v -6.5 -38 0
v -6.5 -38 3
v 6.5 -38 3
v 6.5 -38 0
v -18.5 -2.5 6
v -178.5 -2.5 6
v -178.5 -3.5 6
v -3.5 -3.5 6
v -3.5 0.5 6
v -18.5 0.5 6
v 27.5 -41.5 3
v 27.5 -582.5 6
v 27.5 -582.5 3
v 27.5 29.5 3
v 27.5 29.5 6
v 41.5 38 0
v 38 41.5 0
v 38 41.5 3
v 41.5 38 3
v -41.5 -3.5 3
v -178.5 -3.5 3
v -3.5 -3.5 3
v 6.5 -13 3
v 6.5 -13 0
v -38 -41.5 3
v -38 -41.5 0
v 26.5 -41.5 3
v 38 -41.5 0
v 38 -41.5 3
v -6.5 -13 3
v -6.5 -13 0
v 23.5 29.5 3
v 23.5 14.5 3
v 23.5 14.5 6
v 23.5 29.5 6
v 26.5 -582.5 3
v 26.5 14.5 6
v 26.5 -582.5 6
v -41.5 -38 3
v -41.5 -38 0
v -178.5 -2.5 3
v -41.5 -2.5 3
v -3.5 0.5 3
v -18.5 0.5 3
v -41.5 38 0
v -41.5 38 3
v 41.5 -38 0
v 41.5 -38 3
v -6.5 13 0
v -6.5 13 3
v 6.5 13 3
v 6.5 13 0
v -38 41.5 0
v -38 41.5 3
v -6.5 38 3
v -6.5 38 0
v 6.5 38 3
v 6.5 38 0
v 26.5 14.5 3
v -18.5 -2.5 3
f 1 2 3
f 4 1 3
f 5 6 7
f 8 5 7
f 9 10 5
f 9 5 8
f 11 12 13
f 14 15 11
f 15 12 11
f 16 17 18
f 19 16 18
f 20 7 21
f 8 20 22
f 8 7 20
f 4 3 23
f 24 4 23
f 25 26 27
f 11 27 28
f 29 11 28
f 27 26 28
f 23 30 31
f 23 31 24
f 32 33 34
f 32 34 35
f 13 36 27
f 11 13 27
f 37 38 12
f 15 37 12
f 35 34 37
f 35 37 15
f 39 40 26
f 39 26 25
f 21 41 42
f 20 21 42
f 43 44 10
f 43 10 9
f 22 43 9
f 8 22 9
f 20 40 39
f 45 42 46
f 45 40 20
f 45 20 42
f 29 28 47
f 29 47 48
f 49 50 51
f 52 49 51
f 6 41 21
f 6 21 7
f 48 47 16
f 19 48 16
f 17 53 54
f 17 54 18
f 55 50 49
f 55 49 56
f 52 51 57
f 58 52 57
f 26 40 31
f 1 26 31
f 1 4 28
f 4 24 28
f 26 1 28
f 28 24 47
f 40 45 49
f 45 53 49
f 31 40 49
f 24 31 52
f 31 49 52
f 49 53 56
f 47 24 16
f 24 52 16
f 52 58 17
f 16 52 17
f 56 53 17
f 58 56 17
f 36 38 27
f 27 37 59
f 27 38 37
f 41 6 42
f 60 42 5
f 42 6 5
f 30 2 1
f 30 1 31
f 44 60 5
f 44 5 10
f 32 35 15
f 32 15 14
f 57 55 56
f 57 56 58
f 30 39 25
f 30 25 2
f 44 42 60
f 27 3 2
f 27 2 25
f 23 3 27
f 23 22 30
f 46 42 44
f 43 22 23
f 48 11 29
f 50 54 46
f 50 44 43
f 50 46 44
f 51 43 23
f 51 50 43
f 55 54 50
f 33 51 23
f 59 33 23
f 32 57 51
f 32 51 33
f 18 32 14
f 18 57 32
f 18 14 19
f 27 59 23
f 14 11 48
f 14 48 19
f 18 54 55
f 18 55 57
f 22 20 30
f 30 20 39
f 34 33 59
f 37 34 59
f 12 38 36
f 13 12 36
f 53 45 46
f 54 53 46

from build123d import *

# Parameters (mm, degrees)
SKETCH1_W           = 83
SKETCH1_H           = 83
BOSS_EXTRUDE1_DEPTH = 3
SKETCH2_W           = 13
SKETCH2_H           = 25
CUT_EXTRUDE1_DEPTH  = 3
CHAMFER1_SIZE       = 3.5
SKETCH3_W           = 15
SKETCH3_H           = 3
SKETCH3_W_2         = 3
SKETCH3_H_2         = 15
BOSS_EXTRUDE2_DEPTH = 3
SKETCH5_W           = 175
SKETCH5_H           = 3
BOSS_EXTRUDE4_DEPTH = 1
SKETCH6_W           = 3
SKETCH6_H           = 612
BOSS_EXTRUDE5_DEPTH = 1


with BuildPart() as part:
    # Sketch1 → Boss-Extrude1 (new body)
    with BuildSketch(Plane.XY):
        Rectangle(SKETCH1_W, SKETCH1_H)
    extrude(amount=BOSS_EXTRUDE1_DEPTH)

    # Sketch2 → Cut-Extrude1 (cut)
    with BuildSketch(Plane.XY.offset(3)):
        with Locations((0, 25.5)):
            Rectangle(SKETCH2_W, SKETCH2_H)
        with Locations((0, -25.5)):
            Rectangle(SKETCH2_W, SKETCH2_H)
    extrude(amount=-CUT_EXTRUDE1_DEPTH, mode=Mode.SUBTRACT)

    # Chamfer1
    chamfer1_edges = [part.edges().sort_by_distance(p)[0] for p in [
        (-41.5, 41.5, 1.5),
        (41.5, 41.5, 1.5),
        (41.5, -41.5, 1.5),
        (-41.5, -41.5, 1.5),
    ]]
    chamfer(chamfer1_edges, length=CHAMFER1_SIZE)

    # Sketch3 → Boss-Extrude2 (add)
    with BuildSketch(Plane.XY.offset(3)):
        with Locations((-11, -1)):
            Rectangle(SKETCH3_W, SKETCH3_H)
        with Locations((25, 22)):
            Rectangle(SKETCH3_W_2, SKETCH3_H_2)
    extrude(amount=BOSS_EXTRUDE2_DEPTH)

    # Sketch5 → Boss-Extrude4 (add)
    with BuildSketch(Plane.XZ.offset(2.5)):
        with Locations((-91, 4.5)):
            Rectangle(SKETCH5_W, SKETCH5_H)
    extrude(amount=BOSS_EXTRUDE4_DEPTH)

    # Sketch6 → Boss-Extrude5 (add)
    with BuildSketch(Plane(origin=(26.5, 0, 0), x_dir=(0, 0, -1), z_dir=(1, 0, 0))):
        with Locations((-4.5, -276.5)):
            Rectangle(SKETCH6_W, SKETCH6_H)
    extrude(amount=BOSS_EXTRUDE5_DEPTH)


solid = part.part
